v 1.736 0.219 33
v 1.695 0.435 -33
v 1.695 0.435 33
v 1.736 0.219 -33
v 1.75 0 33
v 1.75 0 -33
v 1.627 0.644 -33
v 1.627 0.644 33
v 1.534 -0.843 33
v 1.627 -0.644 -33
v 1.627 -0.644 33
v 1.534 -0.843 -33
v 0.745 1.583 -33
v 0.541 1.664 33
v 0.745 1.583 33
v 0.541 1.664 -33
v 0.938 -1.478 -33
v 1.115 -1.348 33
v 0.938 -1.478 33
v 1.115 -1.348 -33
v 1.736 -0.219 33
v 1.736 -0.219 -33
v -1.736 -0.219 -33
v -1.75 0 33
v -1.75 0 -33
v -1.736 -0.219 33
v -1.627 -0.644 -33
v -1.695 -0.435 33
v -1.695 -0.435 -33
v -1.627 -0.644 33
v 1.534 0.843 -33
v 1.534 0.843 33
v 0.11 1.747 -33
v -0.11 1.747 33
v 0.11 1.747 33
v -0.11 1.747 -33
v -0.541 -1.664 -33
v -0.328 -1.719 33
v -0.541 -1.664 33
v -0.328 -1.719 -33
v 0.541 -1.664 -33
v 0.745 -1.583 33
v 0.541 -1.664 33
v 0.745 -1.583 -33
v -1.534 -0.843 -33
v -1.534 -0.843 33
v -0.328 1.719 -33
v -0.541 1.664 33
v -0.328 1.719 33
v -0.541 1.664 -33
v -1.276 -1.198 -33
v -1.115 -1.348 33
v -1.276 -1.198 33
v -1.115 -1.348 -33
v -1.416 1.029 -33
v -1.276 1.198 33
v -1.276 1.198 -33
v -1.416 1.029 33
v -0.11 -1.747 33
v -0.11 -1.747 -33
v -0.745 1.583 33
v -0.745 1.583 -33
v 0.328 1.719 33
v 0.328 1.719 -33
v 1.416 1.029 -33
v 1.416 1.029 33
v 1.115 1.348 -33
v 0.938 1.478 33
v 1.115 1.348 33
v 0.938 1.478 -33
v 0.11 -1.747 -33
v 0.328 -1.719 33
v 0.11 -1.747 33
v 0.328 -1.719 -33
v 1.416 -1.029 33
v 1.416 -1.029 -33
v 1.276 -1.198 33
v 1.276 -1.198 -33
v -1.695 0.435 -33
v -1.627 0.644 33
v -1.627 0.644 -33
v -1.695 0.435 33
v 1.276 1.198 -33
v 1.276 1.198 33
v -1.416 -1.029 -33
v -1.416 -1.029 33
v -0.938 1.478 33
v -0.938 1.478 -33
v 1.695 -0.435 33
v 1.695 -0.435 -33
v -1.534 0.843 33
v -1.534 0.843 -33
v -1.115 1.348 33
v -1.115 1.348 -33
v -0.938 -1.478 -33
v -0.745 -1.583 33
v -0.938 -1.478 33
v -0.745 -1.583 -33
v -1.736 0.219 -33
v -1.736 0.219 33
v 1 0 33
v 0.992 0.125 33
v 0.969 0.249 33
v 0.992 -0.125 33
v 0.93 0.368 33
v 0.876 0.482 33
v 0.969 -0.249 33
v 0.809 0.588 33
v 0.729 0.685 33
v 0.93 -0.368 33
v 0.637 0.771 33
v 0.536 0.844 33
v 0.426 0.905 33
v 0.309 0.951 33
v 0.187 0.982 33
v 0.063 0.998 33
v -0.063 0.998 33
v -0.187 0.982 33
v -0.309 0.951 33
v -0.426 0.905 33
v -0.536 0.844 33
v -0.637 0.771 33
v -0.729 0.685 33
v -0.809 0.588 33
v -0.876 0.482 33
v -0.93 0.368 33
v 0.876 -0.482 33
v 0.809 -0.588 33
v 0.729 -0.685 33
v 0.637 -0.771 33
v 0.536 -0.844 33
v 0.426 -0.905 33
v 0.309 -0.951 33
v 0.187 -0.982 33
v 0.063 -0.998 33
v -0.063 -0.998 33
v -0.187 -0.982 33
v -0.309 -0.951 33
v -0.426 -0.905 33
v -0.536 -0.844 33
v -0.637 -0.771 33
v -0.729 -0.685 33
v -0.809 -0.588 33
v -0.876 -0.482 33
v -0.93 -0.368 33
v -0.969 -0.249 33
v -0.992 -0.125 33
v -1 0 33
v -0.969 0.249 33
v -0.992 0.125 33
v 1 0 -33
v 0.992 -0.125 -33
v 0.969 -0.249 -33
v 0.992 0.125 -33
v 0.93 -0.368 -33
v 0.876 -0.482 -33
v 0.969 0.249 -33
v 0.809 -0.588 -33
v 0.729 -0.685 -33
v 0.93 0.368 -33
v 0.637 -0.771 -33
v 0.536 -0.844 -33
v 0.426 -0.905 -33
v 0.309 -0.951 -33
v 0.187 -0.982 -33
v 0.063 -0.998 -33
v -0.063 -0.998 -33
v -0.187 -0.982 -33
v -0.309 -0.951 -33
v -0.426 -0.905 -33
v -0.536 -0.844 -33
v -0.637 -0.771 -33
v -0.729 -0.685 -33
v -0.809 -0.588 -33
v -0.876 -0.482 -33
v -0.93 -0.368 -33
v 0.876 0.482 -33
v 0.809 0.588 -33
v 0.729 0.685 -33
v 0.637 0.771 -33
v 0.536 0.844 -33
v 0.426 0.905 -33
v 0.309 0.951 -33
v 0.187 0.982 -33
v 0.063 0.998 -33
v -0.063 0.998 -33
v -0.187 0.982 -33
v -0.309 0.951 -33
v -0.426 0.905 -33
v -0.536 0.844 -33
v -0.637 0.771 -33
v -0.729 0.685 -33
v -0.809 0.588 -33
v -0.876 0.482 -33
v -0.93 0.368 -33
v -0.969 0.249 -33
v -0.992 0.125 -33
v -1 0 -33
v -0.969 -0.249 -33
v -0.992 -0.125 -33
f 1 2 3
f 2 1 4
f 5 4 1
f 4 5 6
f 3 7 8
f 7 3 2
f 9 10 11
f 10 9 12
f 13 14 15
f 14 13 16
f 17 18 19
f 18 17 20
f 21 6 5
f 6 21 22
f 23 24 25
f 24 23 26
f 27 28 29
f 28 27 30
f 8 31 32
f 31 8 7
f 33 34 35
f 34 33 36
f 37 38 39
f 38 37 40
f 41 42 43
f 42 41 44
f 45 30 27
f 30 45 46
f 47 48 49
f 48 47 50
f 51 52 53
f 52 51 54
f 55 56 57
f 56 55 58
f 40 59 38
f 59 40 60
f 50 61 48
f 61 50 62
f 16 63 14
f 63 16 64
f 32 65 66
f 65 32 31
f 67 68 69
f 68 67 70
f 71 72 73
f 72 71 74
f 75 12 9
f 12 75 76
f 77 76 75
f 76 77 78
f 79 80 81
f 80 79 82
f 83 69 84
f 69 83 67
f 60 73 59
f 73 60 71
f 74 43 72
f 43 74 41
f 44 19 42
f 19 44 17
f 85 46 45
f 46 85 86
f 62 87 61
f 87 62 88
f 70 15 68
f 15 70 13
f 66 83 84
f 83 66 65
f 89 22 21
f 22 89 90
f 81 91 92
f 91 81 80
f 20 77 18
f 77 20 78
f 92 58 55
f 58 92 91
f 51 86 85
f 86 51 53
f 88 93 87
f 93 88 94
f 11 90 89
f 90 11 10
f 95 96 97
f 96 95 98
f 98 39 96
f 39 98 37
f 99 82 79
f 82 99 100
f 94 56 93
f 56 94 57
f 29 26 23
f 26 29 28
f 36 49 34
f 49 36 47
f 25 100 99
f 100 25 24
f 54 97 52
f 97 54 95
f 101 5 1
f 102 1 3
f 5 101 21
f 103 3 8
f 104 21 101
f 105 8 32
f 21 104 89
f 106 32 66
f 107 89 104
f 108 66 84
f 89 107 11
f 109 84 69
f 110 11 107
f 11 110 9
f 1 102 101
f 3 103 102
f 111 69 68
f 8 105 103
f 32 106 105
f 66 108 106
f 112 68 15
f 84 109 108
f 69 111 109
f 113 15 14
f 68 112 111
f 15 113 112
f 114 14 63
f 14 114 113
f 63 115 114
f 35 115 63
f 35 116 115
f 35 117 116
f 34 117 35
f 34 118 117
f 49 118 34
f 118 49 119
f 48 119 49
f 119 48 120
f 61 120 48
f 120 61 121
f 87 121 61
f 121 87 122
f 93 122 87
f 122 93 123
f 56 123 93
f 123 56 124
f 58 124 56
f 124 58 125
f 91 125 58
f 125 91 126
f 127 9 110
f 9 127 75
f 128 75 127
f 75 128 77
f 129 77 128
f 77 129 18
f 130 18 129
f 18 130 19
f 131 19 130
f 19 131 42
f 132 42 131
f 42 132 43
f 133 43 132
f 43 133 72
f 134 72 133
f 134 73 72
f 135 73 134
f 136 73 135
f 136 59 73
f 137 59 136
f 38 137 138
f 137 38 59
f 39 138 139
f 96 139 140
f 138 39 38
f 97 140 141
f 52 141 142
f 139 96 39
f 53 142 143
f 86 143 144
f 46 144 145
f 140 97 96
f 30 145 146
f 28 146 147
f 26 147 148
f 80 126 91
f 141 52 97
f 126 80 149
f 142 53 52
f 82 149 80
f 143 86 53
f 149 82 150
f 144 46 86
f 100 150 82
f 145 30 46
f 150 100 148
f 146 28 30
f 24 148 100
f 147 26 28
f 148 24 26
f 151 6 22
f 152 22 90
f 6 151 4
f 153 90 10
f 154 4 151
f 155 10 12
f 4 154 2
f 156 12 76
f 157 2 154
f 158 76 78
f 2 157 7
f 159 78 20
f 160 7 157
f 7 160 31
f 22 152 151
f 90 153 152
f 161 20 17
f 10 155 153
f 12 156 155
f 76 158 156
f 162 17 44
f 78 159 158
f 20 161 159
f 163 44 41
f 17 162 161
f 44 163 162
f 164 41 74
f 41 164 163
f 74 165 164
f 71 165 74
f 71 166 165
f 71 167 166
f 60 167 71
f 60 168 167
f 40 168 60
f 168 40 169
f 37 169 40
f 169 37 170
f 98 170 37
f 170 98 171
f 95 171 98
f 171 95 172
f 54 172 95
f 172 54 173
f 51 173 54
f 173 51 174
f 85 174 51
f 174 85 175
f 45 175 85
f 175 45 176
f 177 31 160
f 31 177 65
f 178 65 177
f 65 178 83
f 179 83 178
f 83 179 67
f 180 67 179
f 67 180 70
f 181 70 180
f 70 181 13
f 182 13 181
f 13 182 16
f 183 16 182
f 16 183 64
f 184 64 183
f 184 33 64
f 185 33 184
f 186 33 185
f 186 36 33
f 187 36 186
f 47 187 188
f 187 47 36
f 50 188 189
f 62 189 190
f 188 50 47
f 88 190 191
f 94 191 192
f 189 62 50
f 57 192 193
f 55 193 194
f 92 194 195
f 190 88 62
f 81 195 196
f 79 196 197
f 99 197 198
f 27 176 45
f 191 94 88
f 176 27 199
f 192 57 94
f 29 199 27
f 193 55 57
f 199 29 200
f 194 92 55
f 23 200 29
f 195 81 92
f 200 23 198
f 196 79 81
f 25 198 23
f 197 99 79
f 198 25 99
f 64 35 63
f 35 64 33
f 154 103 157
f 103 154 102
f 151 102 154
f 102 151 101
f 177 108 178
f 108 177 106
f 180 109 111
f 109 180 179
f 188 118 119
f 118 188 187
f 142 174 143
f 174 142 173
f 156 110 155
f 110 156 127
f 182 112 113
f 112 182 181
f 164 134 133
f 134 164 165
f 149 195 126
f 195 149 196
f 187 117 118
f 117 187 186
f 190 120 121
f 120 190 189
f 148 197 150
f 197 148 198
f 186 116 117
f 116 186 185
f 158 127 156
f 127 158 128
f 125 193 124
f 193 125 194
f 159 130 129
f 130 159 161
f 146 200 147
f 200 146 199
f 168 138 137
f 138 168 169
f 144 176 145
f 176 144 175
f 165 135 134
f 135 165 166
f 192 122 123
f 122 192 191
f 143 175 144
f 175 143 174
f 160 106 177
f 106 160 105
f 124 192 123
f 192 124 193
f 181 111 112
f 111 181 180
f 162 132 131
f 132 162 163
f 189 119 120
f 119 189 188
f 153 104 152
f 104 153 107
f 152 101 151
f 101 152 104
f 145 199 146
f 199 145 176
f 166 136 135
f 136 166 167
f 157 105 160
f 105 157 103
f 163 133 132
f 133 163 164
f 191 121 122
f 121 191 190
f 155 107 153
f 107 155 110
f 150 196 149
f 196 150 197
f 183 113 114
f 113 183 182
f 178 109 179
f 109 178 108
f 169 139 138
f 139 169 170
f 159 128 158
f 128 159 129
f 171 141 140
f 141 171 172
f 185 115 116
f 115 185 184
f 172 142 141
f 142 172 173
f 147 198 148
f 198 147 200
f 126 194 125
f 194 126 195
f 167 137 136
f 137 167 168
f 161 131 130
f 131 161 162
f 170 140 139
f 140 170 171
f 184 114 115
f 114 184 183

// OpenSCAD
$fn = 50;


difference() {
	union() {
		translate(v = [0, 0, -33.0000000000]) {
			cylinder(h = 66, r = 1.7500000000);
		}
	}
	union() {
		translate(v = [0, 0, -100.0000000000]) {
			cylinder(h = 200, r = 1.0000000000);
		}
	}
}
